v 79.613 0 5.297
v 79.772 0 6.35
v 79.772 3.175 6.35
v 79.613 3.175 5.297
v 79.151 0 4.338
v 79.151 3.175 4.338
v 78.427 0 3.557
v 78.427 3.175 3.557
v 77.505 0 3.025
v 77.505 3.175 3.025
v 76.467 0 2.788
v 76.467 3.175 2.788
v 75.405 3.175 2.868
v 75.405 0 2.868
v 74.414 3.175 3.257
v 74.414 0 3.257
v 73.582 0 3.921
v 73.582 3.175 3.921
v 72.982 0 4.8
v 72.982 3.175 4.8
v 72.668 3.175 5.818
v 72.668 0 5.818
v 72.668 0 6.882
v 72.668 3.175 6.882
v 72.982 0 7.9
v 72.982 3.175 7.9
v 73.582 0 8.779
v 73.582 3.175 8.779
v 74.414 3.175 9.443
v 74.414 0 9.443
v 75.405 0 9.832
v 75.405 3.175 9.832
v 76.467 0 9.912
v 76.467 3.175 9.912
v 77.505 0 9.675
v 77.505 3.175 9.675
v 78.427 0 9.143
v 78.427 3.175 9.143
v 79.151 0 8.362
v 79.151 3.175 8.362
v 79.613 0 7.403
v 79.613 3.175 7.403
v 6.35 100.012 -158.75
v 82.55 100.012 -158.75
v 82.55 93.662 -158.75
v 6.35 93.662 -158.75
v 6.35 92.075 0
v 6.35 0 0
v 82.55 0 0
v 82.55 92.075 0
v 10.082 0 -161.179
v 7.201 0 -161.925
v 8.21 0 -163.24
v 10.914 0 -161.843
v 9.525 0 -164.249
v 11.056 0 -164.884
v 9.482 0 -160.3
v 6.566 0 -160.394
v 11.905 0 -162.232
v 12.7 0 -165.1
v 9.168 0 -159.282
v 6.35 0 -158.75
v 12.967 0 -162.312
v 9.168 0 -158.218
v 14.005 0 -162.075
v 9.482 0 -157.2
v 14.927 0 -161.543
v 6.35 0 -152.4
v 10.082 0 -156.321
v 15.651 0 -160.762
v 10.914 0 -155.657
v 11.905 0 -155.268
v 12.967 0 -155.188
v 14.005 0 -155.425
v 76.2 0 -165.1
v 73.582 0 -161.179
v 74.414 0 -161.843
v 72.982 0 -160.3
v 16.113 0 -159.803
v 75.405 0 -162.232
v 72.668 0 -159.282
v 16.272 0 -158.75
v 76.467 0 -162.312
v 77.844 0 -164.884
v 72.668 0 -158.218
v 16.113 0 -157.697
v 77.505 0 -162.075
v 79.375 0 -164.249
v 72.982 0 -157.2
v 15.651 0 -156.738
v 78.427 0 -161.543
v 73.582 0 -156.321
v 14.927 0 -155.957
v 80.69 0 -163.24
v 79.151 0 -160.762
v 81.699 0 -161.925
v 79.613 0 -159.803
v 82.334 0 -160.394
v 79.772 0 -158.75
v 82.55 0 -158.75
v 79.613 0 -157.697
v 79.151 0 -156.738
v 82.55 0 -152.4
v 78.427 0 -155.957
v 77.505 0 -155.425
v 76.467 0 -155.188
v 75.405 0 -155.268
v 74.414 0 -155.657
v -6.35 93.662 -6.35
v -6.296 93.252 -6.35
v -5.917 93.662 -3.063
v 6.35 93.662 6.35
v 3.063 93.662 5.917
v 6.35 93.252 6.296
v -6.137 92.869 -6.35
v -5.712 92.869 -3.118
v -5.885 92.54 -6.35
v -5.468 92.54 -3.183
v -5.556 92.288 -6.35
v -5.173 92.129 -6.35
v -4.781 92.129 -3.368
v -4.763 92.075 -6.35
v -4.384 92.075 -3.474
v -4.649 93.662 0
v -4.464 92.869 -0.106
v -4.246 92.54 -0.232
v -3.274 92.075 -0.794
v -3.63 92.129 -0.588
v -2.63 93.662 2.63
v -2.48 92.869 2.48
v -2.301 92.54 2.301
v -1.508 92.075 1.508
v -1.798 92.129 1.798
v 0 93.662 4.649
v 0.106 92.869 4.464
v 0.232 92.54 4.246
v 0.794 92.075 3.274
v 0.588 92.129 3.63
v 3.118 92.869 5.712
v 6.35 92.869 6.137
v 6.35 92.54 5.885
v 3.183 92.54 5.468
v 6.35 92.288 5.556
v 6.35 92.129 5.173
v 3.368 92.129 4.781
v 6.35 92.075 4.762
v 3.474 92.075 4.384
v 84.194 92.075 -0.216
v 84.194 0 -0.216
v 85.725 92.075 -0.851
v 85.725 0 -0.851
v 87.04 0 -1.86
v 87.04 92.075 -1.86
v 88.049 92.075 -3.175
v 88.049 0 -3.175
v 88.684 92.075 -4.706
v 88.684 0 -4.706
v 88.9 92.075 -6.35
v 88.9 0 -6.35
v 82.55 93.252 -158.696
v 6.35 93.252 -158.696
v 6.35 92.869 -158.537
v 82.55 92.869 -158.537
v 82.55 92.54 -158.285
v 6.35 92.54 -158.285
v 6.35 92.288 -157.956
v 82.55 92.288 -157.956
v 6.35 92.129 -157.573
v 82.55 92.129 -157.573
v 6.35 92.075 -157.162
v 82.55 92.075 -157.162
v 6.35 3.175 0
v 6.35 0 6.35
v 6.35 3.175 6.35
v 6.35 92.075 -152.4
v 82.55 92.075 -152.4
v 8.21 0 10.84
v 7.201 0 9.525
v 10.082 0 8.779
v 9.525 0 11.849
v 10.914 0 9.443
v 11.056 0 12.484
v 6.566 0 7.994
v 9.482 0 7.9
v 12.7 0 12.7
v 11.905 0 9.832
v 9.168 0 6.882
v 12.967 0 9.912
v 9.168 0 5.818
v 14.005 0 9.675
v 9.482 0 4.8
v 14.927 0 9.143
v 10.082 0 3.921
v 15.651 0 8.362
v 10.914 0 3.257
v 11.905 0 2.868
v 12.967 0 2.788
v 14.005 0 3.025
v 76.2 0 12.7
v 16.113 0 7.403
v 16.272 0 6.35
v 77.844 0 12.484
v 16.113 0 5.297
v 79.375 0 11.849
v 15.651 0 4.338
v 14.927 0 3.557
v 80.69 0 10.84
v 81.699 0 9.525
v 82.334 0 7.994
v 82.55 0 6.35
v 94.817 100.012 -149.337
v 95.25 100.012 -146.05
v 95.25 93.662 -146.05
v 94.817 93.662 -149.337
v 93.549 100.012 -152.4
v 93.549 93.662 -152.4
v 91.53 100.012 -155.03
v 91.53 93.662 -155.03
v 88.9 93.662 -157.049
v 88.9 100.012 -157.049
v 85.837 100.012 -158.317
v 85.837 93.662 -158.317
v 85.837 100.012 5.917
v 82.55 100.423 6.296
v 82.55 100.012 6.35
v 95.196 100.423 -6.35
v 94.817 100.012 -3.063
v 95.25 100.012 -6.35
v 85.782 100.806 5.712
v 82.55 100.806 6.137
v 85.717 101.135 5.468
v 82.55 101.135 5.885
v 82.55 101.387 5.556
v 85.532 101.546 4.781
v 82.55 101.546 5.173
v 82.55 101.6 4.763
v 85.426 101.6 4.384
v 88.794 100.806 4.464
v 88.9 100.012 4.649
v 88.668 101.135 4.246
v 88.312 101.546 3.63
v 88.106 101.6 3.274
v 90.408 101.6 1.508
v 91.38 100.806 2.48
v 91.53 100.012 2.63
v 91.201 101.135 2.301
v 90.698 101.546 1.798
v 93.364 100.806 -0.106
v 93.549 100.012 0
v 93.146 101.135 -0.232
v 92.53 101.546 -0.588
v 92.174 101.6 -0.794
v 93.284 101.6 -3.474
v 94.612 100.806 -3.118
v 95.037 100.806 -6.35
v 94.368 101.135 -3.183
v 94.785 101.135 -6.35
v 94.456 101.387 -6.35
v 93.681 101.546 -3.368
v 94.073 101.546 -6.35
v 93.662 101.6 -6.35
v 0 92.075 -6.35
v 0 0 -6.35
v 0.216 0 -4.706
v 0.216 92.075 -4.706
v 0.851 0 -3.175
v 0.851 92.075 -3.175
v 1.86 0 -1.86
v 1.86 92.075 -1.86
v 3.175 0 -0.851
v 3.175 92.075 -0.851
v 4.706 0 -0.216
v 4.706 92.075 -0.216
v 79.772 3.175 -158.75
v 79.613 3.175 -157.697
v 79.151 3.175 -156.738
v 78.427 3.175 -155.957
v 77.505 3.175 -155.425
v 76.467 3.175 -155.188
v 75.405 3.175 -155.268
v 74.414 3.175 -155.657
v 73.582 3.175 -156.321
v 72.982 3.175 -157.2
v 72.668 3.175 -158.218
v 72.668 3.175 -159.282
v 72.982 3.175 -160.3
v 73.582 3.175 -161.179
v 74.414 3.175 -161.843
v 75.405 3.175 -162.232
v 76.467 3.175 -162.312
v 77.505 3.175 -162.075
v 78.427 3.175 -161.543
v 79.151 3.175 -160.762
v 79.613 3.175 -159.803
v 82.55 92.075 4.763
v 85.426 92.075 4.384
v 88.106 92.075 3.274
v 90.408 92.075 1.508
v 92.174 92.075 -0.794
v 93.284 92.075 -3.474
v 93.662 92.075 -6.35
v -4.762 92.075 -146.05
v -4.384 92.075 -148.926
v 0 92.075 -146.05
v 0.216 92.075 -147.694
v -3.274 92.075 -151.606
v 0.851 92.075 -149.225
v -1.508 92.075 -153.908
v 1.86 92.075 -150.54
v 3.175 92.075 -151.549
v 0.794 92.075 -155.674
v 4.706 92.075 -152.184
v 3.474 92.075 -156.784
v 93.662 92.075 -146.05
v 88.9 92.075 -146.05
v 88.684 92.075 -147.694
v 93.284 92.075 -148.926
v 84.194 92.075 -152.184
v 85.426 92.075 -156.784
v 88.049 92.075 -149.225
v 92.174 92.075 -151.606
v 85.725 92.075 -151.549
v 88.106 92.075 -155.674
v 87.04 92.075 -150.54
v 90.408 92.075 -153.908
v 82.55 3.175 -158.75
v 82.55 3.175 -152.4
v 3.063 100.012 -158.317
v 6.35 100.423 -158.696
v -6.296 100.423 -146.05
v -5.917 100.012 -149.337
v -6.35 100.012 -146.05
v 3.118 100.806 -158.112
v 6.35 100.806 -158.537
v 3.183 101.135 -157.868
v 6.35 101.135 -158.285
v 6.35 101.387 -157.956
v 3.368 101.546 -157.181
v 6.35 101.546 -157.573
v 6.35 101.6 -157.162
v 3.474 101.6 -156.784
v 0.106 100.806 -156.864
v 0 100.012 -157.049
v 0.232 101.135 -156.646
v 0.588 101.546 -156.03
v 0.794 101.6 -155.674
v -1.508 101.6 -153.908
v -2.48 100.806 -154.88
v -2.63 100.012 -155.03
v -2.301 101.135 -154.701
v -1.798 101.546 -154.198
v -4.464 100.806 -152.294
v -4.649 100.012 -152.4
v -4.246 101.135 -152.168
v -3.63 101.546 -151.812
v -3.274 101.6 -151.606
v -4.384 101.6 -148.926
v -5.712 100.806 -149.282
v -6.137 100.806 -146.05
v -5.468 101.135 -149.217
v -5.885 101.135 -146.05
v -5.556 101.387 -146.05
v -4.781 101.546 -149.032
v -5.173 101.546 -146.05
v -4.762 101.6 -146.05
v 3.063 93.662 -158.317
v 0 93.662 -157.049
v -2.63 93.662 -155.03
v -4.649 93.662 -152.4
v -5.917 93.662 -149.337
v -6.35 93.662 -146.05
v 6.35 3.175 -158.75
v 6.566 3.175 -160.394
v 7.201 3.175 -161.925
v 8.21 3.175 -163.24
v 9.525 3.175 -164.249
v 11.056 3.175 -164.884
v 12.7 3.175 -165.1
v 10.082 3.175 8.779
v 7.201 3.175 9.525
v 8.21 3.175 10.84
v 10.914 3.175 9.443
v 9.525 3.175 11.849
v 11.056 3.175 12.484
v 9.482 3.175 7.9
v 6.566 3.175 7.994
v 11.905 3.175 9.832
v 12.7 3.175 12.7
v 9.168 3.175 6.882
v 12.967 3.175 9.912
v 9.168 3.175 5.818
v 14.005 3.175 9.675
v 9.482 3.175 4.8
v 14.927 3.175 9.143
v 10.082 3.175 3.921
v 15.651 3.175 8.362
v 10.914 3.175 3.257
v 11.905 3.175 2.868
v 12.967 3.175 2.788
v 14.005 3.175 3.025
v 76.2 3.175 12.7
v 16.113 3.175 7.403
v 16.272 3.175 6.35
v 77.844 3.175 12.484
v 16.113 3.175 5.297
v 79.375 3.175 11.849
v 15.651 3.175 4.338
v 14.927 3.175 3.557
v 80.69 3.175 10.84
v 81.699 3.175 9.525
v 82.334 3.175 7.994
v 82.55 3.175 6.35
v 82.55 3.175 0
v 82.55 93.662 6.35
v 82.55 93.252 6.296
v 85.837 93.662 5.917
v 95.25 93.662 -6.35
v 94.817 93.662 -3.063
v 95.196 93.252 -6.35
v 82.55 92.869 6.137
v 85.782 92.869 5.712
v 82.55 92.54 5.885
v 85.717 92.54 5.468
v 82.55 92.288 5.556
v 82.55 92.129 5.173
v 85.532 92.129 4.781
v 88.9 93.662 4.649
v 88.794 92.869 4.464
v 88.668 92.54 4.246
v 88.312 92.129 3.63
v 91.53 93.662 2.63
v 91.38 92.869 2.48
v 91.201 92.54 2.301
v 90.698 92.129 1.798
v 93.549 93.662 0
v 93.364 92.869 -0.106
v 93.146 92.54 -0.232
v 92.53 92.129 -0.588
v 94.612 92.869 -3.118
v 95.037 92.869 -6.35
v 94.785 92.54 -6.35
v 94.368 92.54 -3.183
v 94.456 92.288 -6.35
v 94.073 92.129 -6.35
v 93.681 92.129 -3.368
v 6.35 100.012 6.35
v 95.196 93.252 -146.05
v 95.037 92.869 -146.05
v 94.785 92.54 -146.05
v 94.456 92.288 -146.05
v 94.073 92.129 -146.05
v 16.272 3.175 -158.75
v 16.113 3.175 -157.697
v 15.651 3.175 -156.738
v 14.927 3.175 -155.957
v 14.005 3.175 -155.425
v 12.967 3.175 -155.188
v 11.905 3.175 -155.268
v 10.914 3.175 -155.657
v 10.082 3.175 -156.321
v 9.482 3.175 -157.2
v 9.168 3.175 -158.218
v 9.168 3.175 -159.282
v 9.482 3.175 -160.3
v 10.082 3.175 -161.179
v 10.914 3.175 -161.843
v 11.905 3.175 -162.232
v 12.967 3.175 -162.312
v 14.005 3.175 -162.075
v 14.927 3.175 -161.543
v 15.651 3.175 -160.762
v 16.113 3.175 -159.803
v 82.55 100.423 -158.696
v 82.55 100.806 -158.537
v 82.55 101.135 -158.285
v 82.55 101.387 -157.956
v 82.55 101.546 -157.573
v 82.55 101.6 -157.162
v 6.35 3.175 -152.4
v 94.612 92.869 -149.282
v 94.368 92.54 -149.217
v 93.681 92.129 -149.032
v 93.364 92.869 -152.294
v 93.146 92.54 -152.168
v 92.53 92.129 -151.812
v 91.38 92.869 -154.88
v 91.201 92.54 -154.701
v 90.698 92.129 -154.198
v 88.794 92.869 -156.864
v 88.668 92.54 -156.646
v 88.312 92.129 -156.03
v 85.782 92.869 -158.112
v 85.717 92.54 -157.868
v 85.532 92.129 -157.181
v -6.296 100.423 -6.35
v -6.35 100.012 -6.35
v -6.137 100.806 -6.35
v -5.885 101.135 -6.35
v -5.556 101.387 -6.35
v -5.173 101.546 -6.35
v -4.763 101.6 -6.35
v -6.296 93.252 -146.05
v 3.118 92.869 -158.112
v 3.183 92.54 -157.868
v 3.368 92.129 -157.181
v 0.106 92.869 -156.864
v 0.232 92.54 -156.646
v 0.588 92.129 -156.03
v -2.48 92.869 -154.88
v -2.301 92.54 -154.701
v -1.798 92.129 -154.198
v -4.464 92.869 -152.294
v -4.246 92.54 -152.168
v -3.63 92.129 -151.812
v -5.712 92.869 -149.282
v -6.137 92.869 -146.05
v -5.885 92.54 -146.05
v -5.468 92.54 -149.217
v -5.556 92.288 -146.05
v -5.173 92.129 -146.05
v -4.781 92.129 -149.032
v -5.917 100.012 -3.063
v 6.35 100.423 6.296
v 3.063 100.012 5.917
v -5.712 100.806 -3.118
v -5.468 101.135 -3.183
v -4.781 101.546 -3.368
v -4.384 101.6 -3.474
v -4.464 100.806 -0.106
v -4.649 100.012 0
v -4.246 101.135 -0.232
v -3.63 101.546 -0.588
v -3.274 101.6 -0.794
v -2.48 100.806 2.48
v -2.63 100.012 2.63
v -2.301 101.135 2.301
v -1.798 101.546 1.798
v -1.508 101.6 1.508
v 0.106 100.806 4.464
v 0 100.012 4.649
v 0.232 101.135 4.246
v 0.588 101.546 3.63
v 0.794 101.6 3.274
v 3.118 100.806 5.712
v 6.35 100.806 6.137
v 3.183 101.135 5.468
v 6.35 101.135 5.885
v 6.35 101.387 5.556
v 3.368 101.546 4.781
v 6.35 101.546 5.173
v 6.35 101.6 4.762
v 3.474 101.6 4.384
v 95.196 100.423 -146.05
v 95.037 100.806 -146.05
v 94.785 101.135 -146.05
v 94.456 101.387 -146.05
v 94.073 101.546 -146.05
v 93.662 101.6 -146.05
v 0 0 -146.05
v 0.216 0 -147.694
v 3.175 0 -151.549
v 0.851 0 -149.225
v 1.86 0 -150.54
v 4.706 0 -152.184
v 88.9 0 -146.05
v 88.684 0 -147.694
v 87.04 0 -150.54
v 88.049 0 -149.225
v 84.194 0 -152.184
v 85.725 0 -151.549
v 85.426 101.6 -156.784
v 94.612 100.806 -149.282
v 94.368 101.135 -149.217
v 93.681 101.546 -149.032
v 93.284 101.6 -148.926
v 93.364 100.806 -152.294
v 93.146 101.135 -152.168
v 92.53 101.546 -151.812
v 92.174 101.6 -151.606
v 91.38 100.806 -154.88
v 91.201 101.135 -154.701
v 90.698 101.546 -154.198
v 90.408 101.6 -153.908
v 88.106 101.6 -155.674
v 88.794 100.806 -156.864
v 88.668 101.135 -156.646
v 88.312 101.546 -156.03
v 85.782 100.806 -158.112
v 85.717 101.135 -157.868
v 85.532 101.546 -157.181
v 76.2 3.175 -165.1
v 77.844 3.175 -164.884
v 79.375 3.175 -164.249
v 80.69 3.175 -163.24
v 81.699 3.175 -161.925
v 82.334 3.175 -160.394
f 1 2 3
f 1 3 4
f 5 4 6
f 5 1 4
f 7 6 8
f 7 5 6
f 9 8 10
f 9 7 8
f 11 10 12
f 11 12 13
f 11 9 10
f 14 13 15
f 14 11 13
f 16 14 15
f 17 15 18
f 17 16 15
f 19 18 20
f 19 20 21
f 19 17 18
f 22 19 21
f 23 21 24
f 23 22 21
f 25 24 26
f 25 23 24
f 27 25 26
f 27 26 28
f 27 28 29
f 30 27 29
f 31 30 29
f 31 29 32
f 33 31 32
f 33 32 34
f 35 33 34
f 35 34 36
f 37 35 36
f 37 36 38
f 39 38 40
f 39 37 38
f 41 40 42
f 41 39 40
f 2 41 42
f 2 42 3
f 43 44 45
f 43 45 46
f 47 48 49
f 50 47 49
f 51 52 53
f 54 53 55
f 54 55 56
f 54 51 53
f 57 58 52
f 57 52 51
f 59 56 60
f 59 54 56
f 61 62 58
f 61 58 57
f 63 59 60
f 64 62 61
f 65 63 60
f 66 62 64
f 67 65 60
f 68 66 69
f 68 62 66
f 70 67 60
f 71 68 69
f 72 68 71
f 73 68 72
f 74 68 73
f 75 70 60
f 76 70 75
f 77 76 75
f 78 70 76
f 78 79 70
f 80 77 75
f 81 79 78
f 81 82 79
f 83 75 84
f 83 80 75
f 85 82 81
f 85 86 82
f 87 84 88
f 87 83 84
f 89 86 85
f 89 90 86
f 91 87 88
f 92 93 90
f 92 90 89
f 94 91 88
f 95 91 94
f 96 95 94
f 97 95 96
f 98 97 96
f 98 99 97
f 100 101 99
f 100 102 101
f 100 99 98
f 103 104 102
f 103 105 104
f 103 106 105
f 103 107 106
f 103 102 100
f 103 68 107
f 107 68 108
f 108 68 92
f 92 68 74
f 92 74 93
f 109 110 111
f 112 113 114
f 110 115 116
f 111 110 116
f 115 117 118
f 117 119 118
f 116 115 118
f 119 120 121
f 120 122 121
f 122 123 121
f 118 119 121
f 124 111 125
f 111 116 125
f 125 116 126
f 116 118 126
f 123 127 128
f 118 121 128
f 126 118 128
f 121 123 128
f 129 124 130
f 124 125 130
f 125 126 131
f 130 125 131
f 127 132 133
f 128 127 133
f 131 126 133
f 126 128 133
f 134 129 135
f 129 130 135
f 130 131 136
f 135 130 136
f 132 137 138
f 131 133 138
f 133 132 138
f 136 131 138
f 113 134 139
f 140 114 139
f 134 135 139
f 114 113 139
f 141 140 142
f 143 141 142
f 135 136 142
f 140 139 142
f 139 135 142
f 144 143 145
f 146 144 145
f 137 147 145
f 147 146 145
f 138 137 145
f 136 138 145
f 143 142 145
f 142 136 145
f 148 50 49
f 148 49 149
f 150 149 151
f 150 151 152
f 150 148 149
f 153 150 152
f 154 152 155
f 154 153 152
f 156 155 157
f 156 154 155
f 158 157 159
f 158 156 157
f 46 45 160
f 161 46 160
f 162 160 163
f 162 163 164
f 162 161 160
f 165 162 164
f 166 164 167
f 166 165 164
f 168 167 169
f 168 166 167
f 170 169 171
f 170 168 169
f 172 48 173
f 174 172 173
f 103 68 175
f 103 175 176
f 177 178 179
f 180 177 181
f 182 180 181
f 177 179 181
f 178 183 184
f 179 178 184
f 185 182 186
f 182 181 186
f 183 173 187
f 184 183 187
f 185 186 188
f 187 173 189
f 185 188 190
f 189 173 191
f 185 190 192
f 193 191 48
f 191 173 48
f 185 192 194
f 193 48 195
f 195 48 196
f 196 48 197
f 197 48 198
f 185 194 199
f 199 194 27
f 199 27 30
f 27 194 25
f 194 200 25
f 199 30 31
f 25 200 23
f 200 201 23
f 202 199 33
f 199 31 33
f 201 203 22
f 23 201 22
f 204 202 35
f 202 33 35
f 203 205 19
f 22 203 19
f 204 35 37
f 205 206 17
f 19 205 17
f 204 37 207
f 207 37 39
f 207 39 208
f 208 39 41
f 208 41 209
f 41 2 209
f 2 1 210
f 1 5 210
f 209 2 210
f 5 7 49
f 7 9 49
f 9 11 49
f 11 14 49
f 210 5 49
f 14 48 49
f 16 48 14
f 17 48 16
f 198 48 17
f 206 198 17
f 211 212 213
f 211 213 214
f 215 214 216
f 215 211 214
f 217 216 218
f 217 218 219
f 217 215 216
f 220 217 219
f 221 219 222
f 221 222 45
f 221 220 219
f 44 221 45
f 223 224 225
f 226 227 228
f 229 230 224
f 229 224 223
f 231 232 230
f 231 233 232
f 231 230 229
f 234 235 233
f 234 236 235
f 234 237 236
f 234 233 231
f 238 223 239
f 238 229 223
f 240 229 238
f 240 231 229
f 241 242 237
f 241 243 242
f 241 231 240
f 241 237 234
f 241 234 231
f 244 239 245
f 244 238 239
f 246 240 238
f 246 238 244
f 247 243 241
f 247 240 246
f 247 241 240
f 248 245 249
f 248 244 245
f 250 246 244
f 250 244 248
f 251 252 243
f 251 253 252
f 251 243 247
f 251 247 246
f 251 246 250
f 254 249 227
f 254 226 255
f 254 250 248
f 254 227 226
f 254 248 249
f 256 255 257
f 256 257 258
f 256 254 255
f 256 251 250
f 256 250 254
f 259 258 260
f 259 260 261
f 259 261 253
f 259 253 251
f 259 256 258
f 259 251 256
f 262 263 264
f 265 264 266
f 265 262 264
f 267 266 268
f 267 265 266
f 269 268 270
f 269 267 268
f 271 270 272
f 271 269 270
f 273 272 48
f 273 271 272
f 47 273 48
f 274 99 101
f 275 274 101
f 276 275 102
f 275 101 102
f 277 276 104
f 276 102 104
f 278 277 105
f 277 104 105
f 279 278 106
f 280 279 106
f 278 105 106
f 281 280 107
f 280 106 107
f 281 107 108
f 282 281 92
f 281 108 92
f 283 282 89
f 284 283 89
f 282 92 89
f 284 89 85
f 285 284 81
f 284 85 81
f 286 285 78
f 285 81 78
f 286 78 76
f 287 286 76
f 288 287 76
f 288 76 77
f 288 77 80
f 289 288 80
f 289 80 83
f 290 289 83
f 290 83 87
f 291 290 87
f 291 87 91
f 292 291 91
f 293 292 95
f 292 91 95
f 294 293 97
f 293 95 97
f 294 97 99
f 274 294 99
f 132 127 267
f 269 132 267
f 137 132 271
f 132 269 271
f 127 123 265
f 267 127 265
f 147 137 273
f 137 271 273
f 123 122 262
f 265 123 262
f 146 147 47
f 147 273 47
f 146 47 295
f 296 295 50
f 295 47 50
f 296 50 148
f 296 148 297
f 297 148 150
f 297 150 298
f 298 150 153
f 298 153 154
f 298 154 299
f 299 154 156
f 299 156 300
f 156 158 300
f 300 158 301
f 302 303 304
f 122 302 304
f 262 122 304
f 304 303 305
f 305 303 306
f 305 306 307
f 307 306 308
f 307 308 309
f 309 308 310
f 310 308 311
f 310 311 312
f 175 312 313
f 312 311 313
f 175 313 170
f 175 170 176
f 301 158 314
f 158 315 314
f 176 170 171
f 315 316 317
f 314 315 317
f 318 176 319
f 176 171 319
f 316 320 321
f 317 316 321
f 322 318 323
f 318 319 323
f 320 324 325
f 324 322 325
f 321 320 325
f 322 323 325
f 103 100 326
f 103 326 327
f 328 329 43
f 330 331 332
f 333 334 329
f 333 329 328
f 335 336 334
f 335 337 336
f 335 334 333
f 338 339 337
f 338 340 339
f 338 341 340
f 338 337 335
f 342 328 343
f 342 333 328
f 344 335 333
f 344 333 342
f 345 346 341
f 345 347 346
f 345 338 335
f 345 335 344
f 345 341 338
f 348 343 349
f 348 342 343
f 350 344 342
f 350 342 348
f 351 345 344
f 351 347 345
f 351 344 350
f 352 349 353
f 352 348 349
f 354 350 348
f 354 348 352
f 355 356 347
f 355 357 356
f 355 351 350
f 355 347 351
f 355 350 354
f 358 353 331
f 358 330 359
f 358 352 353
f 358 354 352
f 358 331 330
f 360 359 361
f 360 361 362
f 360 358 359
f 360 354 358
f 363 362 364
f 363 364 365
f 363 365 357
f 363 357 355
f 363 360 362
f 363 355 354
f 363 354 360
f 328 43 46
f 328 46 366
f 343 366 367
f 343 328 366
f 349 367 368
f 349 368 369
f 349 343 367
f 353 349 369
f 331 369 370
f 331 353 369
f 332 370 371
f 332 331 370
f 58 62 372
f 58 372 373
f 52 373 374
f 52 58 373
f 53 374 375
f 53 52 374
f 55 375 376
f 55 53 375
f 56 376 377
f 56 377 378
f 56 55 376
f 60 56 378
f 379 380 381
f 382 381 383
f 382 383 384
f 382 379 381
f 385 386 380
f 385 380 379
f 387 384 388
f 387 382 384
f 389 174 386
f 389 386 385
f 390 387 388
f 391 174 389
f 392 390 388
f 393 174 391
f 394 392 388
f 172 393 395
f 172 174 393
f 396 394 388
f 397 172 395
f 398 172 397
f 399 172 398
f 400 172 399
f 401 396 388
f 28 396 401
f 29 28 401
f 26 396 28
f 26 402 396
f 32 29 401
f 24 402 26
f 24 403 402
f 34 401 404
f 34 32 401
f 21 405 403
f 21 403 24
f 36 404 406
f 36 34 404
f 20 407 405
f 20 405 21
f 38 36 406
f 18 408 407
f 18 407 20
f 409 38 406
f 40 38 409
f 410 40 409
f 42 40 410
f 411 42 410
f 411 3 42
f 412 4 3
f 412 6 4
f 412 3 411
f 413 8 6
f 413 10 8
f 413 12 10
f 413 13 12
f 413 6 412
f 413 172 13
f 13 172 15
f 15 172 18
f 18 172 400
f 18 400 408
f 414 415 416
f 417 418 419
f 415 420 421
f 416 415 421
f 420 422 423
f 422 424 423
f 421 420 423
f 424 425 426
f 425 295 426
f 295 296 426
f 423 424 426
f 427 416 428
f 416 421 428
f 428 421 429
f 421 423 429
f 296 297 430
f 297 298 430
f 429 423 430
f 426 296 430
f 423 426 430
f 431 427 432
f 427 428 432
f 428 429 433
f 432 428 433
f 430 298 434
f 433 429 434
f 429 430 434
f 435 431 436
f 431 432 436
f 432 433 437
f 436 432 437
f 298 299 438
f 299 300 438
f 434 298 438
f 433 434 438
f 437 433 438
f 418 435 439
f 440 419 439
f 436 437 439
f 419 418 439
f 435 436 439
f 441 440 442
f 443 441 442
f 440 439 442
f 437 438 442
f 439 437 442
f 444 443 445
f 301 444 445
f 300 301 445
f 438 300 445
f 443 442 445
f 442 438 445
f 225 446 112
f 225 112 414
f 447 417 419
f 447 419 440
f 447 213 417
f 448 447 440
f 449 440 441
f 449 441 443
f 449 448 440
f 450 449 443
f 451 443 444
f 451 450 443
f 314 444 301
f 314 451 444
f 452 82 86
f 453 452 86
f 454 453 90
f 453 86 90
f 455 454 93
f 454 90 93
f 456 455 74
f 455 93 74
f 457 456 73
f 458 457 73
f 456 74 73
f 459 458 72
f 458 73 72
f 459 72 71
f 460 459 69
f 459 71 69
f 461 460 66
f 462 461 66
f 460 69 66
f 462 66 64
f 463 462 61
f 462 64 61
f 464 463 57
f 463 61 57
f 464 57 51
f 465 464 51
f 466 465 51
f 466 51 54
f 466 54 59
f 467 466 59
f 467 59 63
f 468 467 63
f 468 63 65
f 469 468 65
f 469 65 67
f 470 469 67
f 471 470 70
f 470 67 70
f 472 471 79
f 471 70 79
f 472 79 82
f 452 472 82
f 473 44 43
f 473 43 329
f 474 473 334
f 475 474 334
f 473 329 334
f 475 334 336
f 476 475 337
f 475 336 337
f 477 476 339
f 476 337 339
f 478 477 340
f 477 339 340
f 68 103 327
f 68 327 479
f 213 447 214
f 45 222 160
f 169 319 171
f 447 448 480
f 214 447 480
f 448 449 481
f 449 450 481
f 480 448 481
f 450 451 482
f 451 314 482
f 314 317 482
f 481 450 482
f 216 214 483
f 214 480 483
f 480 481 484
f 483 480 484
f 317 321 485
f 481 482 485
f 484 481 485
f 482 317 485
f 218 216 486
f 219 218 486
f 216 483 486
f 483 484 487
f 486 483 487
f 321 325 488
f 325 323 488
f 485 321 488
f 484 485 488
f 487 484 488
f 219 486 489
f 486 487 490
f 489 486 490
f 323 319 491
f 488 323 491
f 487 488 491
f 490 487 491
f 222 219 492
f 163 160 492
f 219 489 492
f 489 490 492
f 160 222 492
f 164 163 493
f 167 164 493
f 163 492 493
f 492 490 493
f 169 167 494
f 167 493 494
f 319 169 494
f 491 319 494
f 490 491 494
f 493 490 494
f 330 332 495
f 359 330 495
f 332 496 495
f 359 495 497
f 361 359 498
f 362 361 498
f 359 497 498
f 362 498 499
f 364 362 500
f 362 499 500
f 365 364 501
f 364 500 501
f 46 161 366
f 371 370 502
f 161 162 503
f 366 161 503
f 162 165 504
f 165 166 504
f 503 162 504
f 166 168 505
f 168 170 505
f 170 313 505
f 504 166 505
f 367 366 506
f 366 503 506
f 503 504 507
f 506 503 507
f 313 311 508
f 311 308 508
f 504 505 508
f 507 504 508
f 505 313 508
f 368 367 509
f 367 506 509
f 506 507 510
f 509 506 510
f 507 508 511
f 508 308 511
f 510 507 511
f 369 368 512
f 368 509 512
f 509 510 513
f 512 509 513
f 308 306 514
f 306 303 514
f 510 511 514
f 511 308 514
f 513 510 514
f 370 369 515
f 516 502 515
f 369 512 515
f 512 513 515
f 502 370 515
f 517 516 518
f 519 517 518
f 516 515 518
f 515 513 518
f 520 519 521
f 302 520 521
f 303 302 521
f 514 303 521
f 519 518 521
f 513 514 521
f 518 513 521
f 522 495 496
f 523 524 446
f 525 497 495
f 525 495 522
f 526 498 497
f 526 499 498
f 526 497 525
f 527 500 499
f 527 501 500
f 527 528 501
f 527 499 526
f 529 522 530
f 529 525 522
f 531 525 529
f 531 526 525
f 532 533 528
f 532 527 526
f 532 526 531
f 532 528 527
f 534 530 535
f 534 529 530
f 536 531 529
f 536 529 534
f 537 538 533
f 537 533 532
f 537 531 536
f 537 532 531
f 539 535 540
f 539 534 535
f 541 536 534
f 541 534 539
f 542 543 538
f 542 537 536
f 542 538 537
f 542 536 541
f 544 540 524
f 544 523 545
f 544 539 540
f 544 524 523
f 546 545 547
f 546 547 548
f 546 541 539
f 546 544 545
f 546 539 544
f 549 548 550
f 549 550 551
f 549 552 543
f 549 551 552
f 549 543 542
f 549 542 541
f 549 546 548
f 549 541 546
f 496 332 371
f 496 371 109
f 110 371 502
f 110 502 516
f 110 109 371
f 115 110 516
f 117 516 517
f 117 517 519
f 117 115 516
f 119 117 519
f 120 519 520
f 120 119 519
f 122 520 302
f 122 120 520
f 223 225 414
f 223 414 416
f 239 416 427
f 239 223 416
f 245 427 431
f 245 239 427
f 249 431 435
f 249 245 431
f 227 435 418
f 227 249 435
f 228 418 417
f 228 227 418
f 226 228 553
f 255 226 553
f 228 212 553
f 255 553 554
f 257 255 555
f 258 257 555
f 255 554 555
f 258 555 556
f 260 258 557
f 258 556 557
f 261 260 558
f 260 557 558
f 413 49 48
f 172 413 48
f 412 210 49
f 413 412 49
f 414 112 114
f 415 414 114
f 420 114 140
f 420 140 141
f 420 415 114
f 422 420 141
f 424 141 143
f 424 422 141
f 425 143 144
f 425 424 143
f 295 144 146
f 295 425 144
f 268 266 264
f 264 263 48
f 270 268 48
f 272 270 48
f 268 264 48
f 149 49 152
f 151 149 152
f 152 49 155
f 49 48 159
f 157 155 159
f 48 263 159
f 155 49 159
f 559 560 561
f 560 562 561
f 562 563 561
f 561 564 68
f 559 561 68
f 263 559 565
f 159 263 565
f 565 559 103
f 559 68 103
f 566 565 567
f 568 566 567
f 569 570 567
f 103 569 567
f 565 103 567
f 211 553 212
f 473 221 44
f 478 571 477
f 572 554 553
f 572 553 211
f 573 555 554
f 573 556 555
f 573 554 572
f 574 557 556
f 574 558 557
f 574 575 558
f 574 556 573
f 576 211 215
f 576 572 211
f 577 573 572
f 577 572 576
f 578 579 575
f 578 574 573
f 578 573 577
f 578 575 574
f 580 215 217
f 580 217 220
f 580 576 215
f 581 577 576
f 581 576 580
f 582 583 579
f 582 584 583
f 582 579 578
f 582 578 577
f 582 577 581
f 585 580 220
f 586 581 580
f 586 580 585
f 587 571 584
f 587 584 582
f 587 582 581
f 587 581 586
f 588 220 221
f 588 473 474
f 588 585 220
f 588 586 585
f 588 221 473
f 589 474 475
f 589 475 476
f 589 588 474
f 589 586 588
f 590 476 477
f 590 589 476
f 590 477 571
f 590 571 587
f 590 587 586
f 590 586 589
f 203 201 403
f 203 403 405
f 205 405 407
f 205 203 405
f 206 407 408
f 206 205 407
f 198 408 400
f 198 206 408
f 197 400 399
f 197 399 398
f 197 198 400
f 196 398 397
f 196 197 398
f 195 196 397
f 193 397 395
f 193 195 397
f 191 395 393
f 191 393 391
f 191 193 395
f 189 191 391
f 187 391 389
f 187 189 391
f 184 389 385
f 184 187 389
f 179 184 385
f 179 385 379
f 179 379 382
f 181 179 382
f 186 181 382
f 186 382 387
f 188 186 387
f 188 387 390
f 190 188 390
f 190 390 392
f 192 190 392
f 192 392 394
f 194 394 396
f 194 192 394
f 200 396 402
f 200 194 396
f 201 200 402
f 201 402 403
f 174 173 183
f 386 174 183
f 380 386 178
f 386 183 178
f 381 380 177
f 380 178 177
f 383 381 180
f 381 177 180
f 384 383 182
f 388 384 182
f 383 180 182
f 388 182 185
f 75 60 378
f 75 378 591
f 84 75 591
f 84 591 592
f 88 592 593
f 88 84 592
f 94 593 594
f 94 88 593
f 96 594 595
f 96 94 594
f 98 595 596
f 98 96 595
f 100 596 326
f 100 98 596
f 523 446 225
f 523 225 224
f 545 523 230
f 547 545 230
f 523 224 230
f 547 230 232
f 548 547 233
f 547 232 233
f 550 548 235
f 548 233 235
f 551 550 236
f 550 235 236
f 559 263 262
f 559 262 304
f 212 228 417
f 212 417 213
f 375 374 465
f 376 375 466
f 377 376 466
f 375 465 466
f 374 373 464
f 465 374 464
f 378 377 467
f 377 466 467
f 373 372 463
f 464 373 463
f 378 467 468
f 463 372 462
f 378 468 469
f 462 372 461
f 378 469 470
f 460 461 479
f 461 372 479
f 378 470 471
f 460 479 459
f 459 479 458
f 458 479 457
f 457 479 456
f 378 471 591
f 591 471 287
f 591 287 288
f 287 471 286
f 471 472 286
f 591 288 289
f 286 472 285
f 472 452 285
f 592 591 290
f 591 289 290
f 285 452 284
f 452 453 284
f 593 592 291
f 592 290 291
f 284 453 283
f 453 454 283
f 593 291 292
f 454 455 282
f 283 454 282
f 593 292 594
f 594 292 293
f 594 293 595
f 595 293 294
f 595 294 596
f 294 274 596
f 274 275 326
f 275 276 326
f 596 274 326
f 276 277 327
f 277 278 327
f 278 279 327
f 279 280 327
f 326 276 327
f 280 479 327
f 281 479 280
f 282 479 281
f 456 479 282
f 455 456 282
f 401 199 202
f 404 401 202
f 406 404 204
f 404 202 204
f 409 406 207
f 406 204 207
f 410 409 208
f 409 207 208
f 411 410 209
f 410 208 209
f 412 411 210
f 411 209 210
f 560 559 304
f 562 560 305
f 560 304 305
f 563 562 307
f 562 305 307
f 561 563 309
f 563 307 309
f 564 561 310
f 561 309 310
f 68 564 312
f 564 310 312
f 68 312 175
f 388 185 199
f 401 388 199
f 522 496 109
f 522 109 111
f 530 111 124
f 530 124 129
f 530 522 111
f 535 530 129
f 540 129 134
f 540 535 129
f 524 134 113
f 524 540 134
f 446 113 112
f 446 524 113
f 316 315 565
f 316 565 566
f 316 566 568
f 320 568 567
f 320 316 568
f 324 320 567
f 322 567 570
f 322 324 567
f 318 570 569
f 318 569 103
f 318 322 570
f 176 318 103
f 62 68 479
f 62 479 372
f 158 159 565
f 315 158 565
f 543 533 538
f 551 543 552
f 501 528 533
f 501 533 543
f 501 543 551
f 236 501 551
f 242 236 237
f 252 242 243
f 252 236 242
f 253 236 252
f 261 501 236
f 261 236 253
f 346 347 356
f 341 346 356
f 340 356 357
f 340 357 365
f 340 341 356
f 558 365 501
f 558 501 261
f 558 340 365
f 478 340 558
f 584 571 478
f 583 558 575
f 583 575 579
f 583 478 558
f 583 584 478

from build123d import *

# Parameters (mm, degrees)
SKETCH1_W           = 88.9
SKETCH1_H           = 152.4
BOSS_EXTRUDE1_DEPTH = 101.6
SKETCH2_R           = 3.571875
BOSS_EXTRUDE2_DEPTH = 3.175
FILLET1_R           = 6.35
BOSS_EXTRUDE3_DEPTH = 9.525
FILLET2_R           = 1.5875


with BuildPart() as part:
    # Sketch1 → Boss-Extrude1 (new body)
    with BuildSketch(Plane(origin=(0, 0, 0), x_dir=(1, 0, 0), z_dir=(0, 1, 0))):
        with Locations((44.45, 76.2)):
            Rectangle(SKETCH1_W, SKETCH1_H)
    extrude(amount=BOSS_EXTRUDE1_DEPTH)

    # Fillet1
    fillet1_edges = [part.edges().sort_by_distance(p)[0] for p in [
        (0, 50.8, -152.4),
        (88.9, 50.8, -152.4),
        (88.9, 50.8, 0),
        (0, 50.8, 0),
    ]]
    fillet(fillet1_edges, radius=FILLET1_R)

    # Sketch4 → Boss-Extrude3 (add)
    with BuildSketch(Plane(origin=(0, 101.6, 0), x_dir=(1, 0, 0), z_dir=(0, 1, 0))):
        with BuildLine():
            Line((95.25, 6.35), (95.25, 146.05))
            ThreePointArc((95.25, 146.05), (91.530256121, 155.030256121), (82.55, 158.75))
            Line((82.55, 158.75), (6.35, 158.75))
            ThreePointArc((6.35, 158.75), (-2.630256121, 155.030256121), (-6.35, 146.05))
            Line((-6.35, 146.05), (-6.35, 6.35))
            ThreePointArc((-6.35, 6.35), (-2.630256121, -2.630256121), (6.35, -6.35))
            Line((6.35, -6.35), (82.55, -6.35))
            ThreePointArc((82.55, -6.35), (91.530256121, -2.630256121), (95.25, 6.35))
        make_face()
    extrude(amount=-BOSS_EXTRUDE3_DEPTH)

    # Fillet2
    fillet2_edges = [part.edges().sort_by_distance(p)[0] for p in [
        (91.530256121, 92.075, 2.630256121),
        (44.45, 92.075, 6.35),
        (-2.630256121, 92.075, 2.630256121),
        (-6.35, 92.075, -76.2),
        (-2.630256121, 92.075, -155.030256121),
        (44.45, 92.075, -158.75),
        (91.530256121, 92.075, -155.030256121),
        (95.25, 92.075, -76.2),
        (91.530256121, 101.6, 2.630256121),
        (95.25, 101.6, -76.2),
        (91.530256121, 101.6, -155.030256121),
        (44.45, 101.6, -158.75),
        (-2.630256121, 101.6, -155.030256121),
        (-6.35, 101.6, -76.2),
        (-2.630256121, 101.6, 2.630256121),
        (44.45, 101.6, 6.35),
    ]]
    fillet(fillet2_edges, radius=FILLET2_R)


with BuildPart() as body_2:
    # Sketch2 → Boss-Extrude2 (new body)
    with BuildSketch(Plane.XZ):
        with BuildLine():
            Line((12.7, -165.1), (76.2, -165.1))
            ThreePointArc((76.2, -165.1), (80.690128061, -163.240128061), (82.55, -158.75))
            Line((82.55, -158.75), (82.55, -152.4))
            Line((82.55, -152.4), (6.35, -152.4))
            Line((6.35, -152.4), (6.35, -158.75))
            ThreePointArc((6.35, -158.75), (8.209871939, -163.240128061), (12.7, -165.1))
        make_face()
        with Locations((12.7, -158.75)):
            Circle(SKETCH2_R, mode=Mode.SUBTRACT)
        with Locations((76.2, -158.75)):
            Circle(SKETCH2_R, mode=Mode.SUBTRACT)
    extrude(amount=-BOSS_EXTRUDE2_DEPTH)


with BuildPart() as body_3:
    # Mirror2: mirrored copy
    add(body_2.part.mirror(Plane(origin=(0, 0, -76.2), x_dir=(1, 0, 0), z_dir=(0, 0, -1))))


solid = Compound([part.part, body_2.part, body_3.part])
